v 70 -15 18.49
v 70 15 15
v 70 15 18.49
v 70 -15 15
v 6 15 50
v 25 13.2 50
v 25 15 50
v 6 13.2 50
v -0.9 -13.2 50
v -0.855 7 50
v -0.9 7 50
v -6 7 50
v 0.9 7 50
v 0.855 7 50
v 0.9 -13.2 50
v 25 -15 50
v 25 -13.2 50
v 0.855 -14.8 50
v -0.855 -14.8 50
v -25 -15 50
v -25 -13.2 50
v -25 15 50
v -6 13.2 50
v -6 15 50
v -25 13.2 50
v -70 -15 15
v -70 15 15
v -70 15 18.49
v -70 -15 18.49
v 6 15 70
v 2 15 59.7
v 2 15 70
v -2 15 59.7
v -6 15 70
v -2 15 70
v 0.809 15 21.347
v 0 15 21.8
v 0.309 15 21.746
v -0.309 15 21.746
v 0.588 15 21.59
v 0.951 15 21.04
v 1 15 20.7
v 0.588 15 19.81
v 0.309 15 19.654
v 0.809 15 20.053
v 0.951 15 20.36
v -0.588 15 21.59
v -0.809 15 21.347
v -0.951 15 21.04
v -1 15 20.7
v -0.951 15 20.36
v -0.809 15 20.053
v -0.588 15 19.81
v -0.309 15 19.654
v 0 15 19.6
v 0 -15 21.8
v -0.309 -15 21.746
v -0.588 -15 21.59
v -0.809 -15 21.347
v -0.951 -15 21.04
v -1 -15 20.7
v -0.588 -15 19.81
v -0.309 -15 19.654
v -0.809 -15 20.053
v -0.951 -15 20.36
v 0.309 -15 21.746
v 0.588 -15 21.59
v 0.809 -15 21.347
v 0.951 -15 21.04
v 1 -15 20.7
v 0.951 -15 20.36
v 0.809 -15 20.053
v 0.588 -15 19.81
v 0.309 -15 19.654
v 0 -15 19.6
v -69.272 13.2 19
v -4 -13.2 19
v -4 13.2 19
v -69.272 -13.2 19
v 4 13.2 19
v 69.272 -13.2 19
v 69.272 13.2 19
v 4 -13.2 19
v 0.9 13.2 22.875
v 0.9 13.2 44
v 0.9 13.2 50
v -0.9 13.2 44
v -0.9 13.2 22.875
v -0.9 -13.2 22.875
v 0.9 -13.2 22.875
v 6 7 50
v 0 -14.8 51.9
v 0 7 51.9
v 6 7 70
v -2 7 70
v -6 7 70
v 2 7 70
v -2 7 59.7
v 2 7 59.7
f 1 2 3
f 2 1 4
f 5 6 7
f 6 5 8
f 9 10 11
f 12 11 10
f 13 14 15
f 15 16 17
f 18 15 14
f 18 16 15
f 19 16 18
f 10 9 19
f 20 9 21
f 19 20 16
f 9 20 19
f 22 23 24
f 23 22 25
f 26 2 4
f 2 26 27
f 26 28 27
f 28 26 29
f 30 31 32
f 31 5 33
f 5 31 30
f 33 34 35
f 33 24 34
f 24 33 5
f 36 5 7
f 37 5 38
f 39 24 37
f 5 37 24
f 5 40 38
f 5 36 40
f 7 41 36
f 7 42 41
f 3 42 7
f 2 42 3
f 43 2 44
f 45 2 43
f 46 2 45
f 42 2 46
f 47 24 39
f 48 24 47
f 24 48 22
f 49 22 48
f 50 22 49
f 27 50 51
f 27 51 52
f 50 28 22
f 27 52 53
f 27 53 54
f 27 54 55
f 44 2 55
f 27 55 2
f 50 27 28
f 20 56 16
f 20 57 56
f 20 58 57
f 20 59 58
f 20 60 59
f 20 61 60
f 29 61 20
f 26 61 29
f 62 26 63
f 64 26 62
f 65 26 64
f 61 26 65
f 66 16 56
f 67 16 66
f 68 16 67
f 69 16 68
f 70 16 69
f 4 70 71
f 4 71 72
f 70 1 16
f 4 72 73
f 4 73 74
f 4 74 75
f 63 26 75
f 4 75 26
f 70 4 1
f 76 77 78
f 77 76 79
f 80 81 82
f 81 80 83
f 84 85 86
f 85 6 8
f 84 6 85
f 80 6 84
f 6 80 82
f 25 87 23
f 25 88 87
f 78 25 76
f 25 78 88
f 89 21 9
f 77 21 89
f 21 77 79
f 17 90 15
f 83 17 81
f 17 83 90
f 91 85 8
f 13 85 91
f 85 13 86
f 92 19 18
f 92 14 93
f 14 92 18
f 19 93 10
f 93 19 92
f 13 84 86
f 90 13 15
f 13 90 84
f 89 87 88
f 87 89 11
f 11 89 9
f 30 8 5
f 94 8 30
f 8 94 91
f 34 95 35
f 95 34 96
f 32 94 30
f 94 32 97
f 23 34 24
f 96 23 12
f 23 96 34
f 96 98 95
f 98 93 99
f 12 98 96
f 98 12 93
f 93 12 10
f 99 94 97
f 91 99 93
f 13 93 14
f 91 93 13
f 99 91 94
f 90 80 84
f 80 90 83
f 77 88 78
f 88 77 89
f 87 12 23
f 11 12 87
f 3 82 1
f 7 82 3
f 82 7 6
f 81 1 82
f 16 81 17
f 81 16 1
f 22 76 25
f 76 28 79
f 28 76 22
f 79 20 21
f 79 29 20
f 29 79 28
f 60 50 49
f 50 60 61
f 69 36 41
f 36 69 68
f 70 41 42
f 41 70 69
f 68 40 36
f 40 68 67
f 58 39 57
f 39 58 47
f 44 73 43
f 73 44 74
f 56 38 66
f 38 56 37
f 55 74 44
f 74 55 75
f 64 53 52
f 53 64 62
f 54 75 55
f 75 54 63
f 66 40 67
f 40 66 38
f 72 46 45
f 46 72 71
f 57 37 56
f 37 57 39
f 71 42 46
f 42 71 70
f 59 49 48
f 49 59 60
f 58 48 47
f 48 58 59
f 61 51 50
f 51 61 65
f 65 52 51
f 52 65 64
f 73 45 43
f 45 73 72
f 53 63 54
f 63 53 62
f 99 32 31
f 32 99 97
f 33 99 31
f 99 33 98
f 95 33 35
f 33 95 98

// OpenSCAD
// inserire i dati nelle variabili premere F6 per generale il modello
// quindi File->Export->Export as STL..
// in fase di stampa rallentarla al 30-40% quando stampa solo l'asta per il magnete.

d = 2;  		// diametro del foro passante in millimetri
l = 8; 			// larghezza asta magnete in millimetri
al = 55; 		// altezza asta magnete in millimetri


// ================================================================================

r = 35;
x = 24;
a = d*2+1;
b = d*2;
z = 11;
zf = z+9;
c = 4;

$fn = 20;

render(){
translate([0,0,30])
difference(){
	union(){
		// vasca principale
		difference(){
			translate([0,0,5/2]) cube([140,30,35], center =true);

			translate([0,0,5/2+4]) cube([145,26.4,35], center =true);
		}
		
		// separatore vaschette
		translate([-1.8/2,-15,-15]) cube([1.8,29,35]);

		// asta magnete
		//translate([-l/2,13.2,-15]) cube ([l,1.8,al]);
		
		// asta magnete spessa
		translate([-6,7,20]) cube ([12,8,20]);
		
		// rinforzo base
		translate([0,15,-z])
		rotate(90,[1,0,0])
		linear_extrude(30,0)
			polygon(points=[ [0,0], [0,a], [b,0] ], path=[0,1,2]);
		mirror([1,0,0])
		translate([0,15,-z])
		rotate(90,[1,0,0])
		linear_extrude(30,0)
			polygon(points=[ [0,0], [0,a], [b,0] ], path=[0,1,2]);

		translate([4,13.2,20]){
		rotate(180,[1,0,0]) rotate(0,[0,1,0]) rotate(90,[0,0,1]) 
			polyhedron(
			points=[ [0,-2,0],[6.2,-2,0],[6.2,3.1,0],[0,3.1,0], // the four points at base
         [0,3.1,6]  ],                                 // the apex point 
  			faces=[ [0,1,4],[1,2,4],[2,3,4],[3,0,4],          // each triangle side
            [1,0,3],[2,1,3] ]                         // two triangles for square base
		);

		// tagliagoccia
		translate([-4,0,-0.1])
		rotate(90,[1,0,0])
		linear_extrude(28,0)
			polygon(points=[ [-0.9,0], [0.9,0], [0,2] ], path=[0,1,2]);
		}

		mirror([1,0,0])
			translate([4,13.2,20]){
			rotate(180,[1,0,0]) rotate(0,[0,1,0]) rotate(90,[0,0,1]) 
				polyhedron(
				points=[ [0,-2,0],[6.2,-2,0],[6.2,3.1,0],[0,3.1,0], // the four points at base
          [0,3.1,6]  ],                                 // the apex point 
  				faces=[ [0,1,4],[1,2,4],[2,3,4],[3,0,4],          // each triangle side
             [1,0,3],[2,1,3] ]                         // two triangles for square base
			);
		}
	}
	
	translate([0,0,9.7]) union(){
		// taglio obliquo
		translate ([x,-20,11]) rotate(r, [0,1,0])cube([100,50,50]);
		
		mirror([1,0,0])
			translate ([x,-20,11]) rotate(r, [0,1,0])cube([100,50,50]);
		
		// foro passante
		multmatrix([ [1,0,0,0], [0,1,0,0], [0,0,1.1,-zf+d/2], [0,0,0,1] ])
		rotate(90, [1,0,0]) cylinder(50,d/2,d/2, center = true);

		// scanso asta magnete
		translate([-c/2,7,20]) cube ([c,8,20]);
		}
	}
}
